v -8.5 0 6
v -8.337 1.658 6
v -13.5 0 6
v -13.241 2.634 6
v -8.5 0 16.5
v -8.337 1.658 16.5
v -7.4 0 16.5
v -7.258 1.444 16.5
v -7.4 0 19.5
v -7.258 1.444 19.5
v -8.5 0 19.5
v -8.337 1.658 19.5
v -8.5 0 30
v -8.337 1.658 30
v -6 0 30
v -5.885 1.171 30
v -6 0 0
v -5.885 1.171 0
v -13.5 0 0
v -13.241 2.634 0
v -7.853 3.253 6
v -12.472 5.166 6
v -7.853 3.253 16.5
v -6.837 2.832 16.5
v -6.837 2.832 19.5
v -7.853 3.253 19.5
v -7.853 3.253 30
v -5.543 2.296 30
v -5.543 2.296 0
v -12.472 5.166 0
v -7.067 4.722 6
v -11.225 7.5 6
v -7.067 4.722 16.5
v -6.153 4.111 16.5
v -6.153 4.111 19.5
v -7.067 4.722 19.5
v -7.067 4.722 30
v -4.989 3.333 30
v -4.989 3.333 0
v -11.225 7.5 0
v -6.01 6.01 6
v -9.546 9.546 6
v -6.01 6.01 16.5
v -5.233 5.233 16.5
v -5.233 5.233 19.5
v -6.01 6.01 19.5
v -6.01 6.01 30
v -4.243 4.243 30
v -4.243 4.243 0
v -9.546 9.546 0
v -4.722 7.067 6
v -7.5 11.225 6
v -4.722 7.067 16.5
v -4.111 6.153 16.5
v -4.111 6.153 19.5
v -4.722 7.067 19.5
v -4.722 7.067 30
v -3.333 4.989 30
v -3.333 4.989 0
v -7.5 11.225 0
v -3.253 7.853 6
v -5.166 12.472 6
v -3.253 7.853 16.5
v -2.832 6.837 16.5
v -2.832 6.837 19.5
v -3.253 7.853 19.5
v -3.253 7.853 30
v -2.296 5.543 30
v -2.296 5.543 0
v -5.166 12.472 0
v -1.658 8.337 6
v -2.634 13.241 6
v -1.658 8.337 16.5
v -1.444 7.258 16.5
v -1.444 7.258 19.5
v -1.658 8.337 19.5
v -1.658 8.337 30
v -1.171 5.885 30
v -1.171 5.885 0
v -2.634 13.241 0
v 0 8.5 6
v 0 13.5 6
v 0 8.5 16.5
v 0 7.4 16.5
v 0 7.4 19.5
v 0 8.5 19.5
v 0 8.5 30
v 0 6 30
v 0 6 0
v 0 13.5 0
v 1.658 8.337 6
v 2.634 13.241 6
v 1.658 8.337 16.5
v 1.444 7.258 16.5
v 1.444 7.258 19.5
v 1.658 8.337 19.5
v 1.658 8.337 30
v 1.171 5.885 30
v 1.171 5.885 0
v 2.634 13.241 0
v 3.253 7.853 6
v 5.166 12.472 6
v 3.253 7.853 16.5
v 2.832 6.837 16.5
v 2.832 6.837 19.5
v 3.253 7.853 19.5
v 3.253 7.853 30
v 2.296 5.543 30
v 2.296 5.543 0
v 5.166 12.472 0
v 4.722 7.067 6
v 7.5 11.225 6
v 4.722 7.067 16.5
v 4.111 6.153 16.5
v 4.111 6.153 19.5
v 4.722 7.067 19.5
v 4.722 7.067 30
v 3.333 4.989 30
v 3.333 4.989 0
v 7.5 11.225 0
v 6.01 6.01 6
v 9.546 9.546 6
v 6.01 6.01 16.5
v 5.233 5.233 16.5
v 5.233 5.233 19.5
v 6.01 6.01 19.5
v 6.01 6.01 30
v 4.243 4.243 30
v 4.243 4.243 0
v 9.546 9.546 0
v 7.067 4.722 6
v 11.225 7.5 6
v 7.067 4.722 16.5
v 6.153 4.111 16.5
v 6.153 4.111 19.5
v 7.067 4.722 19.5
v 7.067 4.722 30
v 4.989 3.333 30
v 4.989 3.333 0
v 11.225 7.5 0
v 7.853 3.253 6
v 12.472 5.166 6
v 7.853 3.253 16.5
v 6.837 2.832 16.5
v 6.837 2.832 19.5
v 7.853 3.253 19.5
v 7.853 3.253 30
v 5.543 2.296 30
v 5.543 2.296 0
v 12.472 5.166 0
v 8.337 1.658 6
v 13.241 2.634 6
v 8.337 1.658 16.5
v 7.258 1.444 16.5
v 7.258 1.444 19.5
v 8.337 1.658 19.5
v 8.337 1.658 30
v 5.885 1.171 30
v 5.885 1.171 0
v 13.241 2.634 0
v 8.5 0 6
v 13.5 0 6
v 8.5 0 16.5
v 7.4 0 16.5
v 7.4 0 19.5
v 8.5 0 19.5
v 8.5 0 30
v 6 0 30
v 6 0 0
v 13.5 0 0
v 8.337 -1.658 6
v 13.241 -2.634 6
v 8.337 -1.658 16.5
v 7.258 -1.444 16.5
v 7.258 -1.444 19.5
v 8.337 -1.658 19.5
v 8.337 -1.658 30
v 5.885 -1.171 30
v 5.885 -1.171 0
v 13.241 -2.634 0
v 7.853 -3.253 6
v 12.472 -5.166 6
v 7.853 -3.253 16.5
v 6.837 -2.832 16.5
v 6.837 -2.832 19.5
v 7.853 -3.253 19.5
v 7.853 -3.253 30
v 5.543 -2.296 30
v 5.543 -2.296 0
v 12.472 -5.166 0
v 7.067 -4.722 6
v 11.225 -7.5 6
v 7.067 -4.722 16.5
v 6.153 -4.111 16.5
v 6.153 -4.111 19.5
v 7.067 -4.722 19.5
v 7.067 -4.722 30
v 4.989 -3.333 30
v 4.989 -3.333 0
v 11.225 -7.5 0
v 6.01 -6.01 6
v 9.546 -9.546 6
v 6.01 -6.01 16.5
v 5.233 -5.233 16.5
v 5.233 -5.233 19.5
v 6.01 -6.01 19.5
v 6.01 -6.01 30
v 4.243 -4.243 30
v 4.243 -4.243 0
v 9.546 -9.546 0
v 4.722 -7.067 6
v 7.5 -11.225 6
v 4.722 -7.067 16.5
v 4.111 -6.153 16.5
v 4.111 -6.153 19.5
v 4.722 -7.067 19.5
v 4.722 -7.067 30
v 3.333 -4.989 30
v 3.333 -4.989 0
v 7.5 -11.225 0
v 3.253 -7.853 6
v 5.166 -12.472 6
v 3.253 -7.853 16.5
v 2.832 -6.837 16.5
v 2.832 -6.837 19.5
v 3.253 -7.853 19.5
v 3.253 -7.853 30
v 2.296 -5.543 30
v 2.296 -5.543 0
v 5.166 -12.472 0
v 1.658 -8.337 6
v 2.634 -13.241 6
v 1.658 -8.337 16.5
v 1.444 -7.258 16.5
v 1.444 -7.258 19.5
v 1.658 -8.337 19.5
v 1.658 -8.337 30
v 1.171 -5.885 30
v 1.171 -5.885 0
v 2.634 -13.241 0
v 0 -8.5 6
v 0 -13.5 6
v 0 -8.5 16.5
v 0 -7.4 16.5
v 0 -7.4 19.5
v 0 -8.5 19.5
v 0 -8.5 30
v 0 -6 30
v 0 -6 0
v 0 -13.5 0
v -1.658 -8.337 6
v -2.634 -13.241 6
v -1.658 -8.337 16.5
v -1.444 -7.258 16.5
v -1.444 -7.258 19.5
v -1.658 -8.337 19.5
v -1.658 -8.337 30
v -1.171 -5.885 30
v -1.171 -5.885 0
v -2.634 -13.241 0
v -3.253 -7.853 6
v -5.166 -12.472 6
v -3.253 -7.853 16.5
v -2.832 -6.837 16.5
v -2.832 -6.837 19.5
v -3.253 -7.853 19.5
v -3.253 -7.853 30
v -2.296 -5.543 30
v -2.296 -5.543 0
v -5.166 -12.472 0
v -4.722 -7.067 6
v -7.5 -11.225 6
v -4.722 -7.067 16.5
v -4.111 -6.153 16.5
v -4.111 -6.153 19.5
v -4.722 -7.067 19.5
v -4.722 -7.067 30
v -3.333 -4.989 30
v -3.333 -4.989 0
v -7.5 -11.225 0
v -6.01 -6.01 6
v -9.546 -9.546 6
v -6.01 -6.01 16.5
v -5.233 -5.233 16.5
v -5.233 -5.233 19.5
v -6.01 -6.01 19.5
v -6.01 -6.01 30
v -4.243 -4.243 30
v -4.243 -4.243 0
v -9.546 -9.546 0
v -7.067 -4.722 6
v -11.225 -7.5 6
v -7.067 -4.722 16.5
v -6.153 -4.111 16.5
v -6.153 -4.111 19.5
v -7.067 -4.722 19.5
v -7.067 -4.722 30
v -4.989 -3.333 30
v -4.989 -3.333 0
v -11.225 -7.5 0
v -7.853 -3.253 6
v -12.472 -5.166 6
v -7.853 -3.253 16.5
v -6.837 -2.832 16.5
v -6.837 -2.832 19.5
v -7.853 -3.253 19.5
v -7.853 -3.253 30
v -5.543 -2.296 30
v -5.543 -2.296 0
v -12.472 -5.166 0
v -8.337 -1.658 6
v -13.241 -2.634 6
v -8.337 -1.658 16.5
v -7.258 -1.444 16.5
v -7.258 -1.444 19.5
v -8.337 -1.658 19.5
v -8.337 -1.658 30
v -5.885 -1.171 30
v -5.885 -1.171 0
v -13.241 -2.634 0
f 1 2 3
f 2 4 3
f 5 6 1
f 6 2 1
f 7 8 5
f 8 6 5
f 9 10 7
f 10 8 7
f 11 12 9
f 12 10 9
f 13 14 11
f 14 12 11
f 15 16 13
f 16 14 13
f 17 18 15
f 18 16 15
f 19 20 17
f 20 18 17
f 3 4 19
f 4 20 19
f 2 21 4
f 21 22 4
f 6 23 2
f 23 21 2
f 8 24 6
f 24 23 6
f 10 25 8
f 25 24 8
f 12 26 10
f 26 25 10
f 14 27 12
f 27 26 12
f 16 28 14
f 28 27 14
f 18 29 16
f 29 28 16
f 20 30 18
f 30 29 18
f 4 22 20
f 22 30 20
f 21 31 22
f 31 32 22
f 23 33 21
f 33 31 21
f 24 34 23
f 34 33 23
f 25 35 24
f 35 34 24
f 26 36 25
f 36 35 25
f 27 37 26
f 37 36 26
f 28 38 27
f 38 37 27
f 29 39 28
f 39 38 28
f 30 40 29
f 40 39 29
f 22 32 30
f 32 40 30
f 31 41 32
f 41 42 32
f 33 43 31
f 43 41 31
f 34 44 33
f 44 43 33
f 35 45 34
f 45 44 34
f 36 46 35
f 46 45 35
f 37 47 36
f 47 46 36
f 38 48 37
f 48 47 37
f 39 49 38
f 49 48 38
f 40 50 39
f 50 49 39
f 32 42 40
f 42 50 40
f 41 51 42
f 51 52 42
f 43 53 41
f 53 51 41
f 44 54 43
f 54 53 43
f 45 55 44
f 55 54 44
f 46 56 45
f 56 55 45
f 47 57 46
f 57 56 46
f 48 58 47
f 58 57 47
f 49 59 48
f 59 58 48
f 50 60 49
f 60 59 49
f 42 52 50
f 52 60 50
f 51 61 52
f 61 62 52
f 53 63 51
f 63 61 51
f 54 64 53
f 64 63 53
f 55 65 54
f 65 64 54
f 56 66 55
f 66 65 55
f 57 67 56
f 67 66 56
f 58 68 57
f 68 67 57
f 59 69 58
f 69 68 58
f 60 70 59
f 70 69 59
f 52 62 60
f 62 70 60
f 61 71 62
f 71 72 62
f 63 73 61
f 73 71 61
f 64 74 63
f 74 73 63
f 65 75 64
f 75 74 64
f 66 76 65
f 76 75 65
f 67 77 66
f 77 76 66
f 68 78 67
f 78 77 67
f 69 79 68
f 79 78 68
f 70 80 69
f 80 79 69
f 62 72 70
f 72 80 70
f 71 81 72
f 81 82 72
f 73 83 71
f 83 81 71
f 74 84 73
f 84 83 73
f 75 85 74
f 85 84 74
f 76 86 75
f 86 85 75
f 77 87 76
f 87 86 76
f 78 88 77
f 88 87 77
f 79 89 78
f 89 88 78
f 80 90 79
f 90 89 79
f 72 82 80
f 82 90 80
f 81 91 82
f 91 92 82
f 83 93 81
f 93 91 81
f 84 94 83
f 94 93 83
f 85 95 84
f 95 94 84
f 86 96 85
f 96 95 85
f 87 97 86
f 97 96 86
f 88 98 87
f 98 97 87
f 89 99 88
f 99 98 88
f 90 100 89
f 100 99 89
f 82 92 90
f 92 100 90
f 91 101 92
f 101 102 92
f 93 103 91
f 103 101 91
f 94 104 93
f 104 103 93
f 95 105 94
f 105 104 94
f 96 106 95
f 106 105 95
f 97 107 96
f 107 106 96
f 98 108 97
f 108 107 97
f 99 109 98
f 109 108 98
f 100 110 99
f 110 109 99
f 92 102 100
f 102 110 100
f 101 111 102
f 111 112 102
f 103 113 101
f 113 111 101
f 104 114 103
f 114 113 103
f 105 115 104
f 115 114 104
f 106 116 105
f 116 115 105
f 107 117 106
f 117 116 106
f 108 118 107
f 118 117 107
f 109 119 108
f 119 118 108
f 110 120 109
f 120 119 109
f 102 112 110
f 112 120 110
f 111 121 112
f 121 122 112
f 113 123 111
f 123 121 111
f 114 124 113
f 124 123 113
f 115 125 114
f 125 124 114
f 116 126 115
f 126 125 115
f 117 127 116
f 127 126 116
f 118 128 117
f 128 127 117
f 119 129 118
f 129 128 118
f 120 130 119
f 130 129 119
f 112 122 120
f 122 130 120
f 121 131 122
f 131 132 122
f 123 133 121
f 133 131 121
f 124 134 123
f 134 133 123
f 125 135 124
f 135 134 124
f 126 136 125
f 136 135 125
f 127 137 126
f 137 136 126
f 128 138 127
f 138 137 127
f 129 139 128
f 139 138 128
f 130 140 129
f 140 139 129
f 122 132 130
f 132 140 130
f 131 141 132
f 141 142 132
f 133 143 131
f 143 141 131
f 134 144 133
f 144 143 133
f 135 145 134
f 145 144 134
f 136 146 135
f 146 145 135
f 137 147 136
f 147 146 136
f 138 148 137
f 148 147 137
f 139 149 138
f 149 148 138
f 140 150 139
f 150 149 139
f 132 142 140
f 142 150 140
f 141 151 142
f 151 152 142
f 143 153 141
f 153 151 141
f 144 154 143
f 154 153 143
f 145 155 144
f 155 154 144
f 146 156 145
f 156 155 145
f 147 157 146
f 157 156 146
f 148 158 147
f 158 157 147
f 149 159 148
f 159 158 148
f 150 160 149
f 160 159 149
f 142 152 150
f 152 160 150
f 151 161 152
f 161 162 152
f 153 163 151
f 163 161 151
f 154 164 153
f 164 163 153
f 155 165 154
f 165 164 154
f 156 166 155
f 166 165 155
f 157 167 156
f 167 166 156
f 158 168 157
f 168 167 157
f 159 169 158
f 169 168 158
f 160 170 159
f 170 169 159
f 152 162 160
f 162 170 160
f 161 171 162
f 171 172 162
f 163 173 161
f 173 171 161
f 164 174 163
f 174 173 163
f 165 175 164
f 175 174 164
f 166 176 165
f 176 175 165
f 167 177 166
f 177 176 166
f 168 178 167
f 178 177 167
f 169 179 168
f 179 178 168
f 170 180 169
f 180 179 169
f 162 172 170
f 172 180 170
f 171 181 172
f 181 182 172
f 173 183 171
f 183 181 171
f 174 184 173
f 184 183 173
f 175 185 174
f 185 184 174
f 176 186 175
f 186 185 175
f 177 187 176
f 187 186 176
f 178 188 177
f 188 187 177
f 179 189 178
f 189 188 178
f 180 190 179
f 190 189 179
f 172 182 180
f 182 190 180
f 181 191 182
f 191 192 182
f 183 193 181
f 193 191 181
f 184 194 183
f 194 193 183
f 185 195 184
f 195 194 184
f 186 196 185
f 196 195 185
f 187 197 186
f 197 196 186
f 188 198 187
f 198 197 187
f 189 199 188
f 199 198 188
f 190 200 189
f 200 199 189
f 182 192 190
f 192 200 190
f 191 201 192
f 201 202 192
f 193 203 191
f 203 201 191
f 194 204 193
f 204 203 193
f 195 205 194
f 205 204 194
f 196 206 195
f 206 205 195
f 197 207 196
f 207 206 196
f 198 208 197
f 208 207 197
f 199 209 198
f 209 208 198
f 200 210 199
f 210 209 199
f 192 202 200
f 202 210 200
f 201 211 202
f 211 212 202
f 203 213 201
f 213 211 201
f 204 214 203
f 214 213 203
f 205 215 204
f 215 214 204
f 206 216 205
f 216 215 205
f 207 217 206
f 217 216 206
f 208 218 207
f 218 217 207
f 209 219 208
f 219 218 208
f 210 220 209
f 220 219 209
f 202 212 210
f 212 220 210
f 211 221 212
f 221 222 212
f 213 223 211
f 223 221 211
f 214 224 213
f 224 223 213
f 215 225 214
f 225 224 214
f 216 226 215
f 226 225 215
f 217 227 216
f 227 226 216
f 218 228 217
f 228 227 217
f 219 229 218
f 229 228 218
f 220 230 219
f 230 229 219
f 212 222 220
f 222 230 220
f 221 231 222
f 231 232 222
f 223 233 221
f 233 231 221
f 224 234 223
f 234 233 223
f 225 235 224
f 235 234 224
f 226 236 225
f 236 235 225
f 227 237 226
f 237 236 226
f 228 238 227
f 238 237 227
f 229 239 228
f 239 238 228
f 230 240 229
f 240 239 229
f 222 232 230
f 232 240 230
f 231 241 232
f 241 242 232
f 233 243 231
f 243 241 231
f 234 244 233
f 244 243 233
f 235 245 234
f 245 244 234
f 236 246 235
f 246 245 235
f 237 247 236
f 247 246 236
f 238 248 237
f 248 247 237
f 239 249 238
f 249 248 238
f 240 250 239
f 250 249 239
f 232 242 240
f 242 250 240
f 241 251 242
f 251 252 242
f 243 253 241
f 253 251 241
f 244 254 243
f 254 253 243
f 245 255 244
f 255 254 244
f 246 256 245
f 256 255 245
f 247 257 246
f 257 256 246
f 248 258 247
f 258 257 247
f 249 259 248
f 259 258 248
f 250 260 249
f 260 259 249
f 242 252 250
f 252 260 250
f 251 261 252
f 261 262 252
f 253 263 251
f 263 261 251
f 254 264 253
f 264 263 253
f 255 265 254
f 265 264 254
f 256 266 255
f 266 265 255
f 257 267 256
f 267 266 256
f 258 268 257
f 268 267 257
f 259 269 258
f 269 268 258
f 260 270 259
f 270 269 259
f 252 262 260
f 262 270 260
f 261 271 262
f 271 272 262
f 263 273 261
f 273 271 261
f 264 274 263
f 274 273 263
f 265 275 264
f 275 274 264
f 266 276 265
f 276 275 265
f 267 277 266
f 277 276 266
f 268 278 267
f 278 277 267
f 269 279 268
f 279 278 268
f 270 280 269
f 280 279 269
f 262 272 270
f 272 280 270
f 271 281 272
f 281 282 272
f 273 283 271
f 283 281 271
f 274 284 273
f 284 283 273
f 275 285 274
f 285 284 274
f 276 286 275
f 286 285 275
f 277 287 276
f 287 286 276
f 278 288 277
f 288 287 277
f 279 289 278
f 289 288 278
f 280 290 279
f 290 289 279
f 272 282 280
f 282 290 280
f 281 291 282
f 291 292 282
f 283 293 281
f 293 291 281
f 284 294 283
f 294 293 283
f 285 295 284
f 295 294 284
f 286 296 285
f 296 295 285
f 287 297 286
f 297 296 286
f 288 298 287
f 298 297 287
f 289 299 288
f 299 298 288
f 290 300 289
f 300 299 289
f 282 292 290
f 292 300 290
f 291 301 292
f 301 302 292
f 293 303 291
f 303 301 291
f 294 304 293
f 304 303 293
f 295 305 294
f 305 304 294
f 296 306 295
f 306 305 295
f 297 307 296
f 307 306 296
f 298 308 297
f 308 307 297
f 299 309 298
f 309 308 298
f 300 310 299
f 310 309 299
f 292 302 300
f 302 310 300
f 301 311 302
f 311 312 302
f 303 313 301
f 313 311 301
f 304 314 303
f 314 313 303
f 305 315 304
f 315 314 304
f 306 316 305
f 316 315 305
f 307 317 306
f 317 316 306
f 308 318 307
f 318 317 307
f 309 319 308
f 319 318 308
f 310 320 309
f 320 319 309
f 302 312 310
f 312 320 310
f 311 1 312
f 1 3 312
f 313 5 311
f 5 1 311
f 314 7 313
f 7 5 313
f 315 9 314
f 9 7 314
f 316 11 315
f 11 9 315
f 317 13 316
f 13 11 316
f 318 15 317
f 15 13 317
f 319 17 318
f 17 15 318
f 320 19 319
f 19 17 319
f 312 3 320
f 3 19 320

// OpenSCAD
$fn = 32;

// ----------------------------------------------------------------------
// Grooved revolve: flanged, bore R6
// ----------------------------------------------------------------------

// --- parameters (mm) ---
bore_r = 6;               // bore radius
outer_r = 8.5;            // outer radius of the body
total_h = 30;             // overall height, Z
wall = 2.5;               // radial wall thickness
groove_w = 3;             // groove width
groove_d = 1.1;           // groove depth
grooves = 1;              // number of outer grooves
flange_r = 13.5;          // flange radius
flange_h = 6;             // flange height

bbox_x = 2 * flange_r;  // full diameter
bore_d = 2 * bore_r;  // bore diameter
body_d = 2 * outer_r;  // body diameter
flange_d = 2 * flange_r;  // flange diameter
revolve_angle = 360;  // full turn around the Z axis

profile = [[6, 0], [8.5, 0], [13.5, 0], [13.5, 6], [8.5, 6], [8.5, 16.5], [7.4, 16.5], [7.4, 19.5], [8.5, 19.5], [8.5, 30], [6, 30]];  // primary outline, 11 points, counter clockwise

// --- the one profile operation ---
rotate_extrude(angle = revolve_angle) polygon(points = profile);
